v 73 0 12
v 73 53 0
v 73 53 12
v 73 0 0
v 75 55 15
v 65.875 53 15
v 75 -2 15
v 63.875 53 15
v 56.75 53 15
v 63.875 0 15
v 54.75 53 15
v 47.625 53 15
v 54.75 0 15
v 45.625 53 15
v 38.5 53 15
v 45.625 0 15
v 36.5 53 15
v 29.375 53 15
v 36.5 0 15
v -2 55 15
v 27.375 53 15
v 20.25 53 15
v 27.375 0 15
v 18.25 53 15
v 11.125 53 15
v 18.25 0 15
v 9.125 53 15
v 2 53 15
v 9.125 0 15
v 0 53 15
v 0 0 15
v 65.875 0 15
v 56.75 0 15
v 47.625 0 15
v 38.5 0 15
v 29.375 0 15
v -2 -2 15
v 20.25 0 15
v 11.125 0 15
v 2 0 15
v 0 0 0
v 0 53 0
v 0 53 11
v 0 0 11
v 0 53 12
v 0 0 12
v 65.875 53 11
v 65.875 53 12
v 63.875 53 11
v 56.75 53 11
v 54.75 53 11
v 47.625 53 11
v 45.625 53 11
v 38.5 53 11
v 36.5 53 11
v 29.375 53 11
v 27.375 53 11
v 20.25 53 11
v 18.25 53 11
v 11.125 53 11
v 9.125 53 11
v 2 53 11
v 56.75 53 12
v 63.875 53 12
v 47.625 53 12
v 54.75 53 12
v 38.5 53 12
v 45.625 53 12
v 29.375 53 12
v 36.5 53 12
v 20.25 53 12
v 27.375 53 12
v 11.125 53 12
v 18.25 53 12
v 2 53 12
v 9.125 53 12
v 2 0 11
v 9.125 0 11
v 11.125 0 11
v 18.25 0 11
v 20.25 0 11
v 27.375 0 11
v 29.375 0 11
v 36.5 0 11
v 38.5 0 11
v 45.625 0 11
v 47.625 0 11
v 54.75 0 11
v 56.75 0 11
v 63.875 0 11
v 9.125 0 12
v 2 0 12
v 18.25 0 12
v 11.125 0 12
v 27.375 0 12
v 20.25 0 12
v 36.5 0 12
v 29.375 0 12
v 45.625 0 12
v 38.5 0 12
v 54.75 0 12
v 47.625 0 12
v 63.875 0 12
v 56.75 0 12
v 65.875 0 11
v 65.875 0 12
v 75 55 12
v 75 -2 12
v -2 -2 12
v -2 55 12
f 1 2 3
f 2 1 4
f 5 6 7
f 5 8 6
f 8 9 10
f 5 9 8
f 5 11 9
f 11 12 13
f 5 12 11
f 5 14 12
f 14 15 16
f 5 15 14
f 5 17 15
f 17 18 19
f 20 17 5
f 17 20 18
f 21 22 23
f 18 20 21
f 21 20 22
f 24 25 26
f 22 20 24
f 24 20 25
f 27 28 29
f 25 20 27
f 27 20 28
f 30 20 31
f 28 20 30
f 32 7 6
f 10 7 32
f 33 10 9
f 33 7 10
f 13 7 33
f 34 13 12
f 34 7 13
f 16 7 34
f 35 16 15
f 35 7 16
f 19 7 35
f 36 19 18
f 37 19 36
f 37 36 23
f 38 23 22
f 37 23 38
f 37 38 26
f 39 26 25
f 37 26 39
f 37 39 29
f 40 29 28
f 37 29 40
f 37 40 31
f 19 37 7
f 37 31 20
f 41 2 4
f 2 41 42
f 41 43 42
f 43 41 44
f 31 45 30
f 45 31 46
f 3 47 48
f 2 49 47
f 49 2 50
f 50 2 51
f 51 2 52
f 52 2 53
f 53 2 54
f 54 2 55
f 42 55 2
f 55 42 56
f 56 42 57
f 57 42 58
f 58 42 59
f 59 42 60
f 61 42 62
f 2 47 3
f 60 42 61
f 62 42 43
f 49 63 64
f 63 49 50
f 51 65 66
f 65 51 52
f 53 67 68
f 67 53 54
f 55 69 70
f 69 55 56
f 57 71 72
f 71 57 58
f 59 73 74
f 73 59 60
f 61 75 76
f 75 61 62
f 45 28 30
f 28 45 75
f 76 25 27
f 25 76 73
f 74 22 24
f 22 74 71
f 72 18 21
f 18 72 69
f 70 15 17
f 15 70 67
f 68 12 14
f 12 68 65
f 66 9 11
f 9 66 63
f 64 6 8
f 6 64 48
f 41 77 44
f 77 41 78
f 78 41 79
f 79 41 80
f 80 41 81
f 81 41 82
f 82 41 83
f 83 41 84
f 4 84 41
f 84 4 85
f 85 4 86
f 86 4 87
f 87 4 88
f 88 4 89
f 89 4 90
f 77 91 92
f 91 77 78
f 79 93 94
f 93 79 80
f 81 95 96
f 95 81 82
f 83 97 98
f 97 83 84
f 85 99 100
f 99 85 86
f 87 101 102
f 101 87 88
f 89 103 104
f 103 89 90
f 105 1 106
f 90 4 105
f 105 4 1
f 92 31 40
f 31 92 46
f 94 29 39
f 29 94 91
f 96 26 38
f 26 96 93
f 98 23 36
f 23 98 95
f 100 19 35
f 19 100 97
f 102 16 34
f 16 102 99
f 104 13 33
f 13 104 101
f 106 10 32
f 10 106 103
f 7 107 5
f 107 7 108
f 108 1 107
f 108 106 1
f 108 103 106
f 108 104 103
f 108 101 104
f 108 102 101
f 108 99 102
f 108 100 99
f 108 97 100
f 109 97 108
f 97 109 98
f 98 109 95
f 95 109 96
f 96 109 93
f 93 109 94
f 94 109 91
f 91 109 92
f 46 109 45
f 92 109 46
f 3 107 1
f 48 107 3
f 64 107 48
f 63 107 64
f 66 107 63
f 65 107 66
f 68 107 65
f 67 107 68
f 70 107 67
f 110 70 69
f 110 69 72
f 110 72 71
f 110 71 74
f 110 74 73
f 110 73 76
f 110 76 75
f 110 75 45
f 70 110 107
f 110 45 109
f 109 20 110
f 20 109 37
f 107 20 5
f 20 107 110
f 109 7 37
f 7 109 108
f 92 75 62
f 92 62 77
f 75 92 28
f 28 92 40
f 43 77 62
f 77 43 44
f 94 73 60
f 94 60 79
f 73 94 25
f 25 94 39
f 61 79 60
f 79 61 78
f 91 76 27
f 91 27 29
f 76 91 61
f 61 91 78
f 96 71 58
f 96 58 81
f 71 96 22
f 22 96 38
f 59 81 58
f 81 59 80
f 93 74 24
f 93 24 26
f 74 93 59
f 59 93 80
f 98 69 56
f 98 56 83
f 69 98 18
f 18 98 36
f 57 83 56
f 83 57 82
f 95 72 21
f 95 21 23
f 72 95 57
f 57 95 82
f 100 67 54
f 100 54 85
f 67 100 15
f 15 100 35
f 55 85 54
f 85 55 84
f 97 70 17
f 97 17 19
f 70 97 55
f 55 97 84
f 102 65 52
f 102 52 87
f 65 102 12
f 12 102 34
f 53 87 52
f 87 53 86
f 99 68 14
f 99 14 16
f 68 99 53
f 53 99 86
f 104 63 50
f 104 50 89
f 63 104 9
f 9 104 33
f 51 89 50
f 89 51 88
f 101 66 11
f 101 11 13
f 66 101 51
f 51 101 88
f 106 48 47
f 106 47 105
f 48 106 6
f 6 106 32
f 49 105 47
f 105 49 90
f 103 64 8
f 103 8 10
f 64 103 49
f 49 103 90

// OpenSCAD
// file: ../config.scad
// config.scad — single source of truth for every physical dimension
// used across modules/. Status tags match docs/PROJECT-SPEC.md's
// Parameters table: MEASURED (trust it), SOURCE (verify with calipers
// before printing), MEASURE (blocked, no real value exists yet).

// Connector geometry — DECIDED, shared across all modules
tab_width           = 9;     // mm, spec range 8-10mm
tab_depth           = 3.5;   // mm, spec range 3-4mm
tab_clearance       = 0.175; // mm per side, spec range 0.15-0.2mm
base_plinth_height  = 8;     // mm, shared plinth height across all modules

// Physical measurements
bottle_diameter = 28;    // mm — SOURCE: Vallejo 20ml listing, proxy for Smallbudi 20ml bottles
handle_width    = 10;    // mm — MEASURED: user's brush set
brush_length    = 220;   // mm — MEASURED: user's brush set
marker_diameter = undef; // MEASURE: no marker product selected yet — blocks modules/marker_holders.scad
// main file
// modules/scrubber_insert.scad — ribbed insert that drops into
// Module 2's well footprint. A lip rests on the reservoir's rim so it
// doesn't float once the reservoir has water in it. No connector
// edges — this isn't a standalone bench module, it's an insert for
// water_reservoir.scad, so its dimensions are hardcoded against that
// module's interior well (74x54, from footprint 80x60 minus 2x the
// 3mm wall) rather than `use`-importing it, which would pull in that
// file's own top-level footprint_x/wall/etc and collide with this
// file's names.
include <../config.scad>

well_interior_x  = 74; // water_reservoir.scad: footprint_x(80) - 2*wall(3)
well_interior_y  = 54; // water_reservoir.scad: footprint_y(60) - 2*wall(3)

// Same fit-clearance reasoning as the bottle wells (see
// docs/PROJECT-SPEC.md): a part pulled in/out by hand needs real
// clearance, not the 0.175mm tuned for a printed-in-place snap
// connector. 0.5mm/side is the low end of that guidance.
insert_clearance = 0.5;
insert_x    = well_interior_x - 2*insert_clearance;
insert_y    = well_interior_y - 2*insert_clearance;
insert_h    = 15;      // shorter than the reservoir's 20mm well_depth
lip_h       = 3;
lip_overhang = 2;      // mm the lip extends past the opening on each
                        // side, resting on the reservoir's 3mm rim
                        // wall with 1mm margin from the outer edge
rib_count   = 8;
rib_width   = 2;

difference() {
    union() {
        cube([insert_x, insert_y, insert_h]);
        translate([-lip_overhang, -lip_overhang, insert_h - lip_h])
            cube([insert_x + 2*lip_overhang, insert_y + 2*lip_overhang, lip_h]);
    }
    for (i = [0:rib_count-1])
        translate([i * (insert_x/rib_count), 0, insert_h - 4])
            cube([rib_width, insert_y, 5]);
}
